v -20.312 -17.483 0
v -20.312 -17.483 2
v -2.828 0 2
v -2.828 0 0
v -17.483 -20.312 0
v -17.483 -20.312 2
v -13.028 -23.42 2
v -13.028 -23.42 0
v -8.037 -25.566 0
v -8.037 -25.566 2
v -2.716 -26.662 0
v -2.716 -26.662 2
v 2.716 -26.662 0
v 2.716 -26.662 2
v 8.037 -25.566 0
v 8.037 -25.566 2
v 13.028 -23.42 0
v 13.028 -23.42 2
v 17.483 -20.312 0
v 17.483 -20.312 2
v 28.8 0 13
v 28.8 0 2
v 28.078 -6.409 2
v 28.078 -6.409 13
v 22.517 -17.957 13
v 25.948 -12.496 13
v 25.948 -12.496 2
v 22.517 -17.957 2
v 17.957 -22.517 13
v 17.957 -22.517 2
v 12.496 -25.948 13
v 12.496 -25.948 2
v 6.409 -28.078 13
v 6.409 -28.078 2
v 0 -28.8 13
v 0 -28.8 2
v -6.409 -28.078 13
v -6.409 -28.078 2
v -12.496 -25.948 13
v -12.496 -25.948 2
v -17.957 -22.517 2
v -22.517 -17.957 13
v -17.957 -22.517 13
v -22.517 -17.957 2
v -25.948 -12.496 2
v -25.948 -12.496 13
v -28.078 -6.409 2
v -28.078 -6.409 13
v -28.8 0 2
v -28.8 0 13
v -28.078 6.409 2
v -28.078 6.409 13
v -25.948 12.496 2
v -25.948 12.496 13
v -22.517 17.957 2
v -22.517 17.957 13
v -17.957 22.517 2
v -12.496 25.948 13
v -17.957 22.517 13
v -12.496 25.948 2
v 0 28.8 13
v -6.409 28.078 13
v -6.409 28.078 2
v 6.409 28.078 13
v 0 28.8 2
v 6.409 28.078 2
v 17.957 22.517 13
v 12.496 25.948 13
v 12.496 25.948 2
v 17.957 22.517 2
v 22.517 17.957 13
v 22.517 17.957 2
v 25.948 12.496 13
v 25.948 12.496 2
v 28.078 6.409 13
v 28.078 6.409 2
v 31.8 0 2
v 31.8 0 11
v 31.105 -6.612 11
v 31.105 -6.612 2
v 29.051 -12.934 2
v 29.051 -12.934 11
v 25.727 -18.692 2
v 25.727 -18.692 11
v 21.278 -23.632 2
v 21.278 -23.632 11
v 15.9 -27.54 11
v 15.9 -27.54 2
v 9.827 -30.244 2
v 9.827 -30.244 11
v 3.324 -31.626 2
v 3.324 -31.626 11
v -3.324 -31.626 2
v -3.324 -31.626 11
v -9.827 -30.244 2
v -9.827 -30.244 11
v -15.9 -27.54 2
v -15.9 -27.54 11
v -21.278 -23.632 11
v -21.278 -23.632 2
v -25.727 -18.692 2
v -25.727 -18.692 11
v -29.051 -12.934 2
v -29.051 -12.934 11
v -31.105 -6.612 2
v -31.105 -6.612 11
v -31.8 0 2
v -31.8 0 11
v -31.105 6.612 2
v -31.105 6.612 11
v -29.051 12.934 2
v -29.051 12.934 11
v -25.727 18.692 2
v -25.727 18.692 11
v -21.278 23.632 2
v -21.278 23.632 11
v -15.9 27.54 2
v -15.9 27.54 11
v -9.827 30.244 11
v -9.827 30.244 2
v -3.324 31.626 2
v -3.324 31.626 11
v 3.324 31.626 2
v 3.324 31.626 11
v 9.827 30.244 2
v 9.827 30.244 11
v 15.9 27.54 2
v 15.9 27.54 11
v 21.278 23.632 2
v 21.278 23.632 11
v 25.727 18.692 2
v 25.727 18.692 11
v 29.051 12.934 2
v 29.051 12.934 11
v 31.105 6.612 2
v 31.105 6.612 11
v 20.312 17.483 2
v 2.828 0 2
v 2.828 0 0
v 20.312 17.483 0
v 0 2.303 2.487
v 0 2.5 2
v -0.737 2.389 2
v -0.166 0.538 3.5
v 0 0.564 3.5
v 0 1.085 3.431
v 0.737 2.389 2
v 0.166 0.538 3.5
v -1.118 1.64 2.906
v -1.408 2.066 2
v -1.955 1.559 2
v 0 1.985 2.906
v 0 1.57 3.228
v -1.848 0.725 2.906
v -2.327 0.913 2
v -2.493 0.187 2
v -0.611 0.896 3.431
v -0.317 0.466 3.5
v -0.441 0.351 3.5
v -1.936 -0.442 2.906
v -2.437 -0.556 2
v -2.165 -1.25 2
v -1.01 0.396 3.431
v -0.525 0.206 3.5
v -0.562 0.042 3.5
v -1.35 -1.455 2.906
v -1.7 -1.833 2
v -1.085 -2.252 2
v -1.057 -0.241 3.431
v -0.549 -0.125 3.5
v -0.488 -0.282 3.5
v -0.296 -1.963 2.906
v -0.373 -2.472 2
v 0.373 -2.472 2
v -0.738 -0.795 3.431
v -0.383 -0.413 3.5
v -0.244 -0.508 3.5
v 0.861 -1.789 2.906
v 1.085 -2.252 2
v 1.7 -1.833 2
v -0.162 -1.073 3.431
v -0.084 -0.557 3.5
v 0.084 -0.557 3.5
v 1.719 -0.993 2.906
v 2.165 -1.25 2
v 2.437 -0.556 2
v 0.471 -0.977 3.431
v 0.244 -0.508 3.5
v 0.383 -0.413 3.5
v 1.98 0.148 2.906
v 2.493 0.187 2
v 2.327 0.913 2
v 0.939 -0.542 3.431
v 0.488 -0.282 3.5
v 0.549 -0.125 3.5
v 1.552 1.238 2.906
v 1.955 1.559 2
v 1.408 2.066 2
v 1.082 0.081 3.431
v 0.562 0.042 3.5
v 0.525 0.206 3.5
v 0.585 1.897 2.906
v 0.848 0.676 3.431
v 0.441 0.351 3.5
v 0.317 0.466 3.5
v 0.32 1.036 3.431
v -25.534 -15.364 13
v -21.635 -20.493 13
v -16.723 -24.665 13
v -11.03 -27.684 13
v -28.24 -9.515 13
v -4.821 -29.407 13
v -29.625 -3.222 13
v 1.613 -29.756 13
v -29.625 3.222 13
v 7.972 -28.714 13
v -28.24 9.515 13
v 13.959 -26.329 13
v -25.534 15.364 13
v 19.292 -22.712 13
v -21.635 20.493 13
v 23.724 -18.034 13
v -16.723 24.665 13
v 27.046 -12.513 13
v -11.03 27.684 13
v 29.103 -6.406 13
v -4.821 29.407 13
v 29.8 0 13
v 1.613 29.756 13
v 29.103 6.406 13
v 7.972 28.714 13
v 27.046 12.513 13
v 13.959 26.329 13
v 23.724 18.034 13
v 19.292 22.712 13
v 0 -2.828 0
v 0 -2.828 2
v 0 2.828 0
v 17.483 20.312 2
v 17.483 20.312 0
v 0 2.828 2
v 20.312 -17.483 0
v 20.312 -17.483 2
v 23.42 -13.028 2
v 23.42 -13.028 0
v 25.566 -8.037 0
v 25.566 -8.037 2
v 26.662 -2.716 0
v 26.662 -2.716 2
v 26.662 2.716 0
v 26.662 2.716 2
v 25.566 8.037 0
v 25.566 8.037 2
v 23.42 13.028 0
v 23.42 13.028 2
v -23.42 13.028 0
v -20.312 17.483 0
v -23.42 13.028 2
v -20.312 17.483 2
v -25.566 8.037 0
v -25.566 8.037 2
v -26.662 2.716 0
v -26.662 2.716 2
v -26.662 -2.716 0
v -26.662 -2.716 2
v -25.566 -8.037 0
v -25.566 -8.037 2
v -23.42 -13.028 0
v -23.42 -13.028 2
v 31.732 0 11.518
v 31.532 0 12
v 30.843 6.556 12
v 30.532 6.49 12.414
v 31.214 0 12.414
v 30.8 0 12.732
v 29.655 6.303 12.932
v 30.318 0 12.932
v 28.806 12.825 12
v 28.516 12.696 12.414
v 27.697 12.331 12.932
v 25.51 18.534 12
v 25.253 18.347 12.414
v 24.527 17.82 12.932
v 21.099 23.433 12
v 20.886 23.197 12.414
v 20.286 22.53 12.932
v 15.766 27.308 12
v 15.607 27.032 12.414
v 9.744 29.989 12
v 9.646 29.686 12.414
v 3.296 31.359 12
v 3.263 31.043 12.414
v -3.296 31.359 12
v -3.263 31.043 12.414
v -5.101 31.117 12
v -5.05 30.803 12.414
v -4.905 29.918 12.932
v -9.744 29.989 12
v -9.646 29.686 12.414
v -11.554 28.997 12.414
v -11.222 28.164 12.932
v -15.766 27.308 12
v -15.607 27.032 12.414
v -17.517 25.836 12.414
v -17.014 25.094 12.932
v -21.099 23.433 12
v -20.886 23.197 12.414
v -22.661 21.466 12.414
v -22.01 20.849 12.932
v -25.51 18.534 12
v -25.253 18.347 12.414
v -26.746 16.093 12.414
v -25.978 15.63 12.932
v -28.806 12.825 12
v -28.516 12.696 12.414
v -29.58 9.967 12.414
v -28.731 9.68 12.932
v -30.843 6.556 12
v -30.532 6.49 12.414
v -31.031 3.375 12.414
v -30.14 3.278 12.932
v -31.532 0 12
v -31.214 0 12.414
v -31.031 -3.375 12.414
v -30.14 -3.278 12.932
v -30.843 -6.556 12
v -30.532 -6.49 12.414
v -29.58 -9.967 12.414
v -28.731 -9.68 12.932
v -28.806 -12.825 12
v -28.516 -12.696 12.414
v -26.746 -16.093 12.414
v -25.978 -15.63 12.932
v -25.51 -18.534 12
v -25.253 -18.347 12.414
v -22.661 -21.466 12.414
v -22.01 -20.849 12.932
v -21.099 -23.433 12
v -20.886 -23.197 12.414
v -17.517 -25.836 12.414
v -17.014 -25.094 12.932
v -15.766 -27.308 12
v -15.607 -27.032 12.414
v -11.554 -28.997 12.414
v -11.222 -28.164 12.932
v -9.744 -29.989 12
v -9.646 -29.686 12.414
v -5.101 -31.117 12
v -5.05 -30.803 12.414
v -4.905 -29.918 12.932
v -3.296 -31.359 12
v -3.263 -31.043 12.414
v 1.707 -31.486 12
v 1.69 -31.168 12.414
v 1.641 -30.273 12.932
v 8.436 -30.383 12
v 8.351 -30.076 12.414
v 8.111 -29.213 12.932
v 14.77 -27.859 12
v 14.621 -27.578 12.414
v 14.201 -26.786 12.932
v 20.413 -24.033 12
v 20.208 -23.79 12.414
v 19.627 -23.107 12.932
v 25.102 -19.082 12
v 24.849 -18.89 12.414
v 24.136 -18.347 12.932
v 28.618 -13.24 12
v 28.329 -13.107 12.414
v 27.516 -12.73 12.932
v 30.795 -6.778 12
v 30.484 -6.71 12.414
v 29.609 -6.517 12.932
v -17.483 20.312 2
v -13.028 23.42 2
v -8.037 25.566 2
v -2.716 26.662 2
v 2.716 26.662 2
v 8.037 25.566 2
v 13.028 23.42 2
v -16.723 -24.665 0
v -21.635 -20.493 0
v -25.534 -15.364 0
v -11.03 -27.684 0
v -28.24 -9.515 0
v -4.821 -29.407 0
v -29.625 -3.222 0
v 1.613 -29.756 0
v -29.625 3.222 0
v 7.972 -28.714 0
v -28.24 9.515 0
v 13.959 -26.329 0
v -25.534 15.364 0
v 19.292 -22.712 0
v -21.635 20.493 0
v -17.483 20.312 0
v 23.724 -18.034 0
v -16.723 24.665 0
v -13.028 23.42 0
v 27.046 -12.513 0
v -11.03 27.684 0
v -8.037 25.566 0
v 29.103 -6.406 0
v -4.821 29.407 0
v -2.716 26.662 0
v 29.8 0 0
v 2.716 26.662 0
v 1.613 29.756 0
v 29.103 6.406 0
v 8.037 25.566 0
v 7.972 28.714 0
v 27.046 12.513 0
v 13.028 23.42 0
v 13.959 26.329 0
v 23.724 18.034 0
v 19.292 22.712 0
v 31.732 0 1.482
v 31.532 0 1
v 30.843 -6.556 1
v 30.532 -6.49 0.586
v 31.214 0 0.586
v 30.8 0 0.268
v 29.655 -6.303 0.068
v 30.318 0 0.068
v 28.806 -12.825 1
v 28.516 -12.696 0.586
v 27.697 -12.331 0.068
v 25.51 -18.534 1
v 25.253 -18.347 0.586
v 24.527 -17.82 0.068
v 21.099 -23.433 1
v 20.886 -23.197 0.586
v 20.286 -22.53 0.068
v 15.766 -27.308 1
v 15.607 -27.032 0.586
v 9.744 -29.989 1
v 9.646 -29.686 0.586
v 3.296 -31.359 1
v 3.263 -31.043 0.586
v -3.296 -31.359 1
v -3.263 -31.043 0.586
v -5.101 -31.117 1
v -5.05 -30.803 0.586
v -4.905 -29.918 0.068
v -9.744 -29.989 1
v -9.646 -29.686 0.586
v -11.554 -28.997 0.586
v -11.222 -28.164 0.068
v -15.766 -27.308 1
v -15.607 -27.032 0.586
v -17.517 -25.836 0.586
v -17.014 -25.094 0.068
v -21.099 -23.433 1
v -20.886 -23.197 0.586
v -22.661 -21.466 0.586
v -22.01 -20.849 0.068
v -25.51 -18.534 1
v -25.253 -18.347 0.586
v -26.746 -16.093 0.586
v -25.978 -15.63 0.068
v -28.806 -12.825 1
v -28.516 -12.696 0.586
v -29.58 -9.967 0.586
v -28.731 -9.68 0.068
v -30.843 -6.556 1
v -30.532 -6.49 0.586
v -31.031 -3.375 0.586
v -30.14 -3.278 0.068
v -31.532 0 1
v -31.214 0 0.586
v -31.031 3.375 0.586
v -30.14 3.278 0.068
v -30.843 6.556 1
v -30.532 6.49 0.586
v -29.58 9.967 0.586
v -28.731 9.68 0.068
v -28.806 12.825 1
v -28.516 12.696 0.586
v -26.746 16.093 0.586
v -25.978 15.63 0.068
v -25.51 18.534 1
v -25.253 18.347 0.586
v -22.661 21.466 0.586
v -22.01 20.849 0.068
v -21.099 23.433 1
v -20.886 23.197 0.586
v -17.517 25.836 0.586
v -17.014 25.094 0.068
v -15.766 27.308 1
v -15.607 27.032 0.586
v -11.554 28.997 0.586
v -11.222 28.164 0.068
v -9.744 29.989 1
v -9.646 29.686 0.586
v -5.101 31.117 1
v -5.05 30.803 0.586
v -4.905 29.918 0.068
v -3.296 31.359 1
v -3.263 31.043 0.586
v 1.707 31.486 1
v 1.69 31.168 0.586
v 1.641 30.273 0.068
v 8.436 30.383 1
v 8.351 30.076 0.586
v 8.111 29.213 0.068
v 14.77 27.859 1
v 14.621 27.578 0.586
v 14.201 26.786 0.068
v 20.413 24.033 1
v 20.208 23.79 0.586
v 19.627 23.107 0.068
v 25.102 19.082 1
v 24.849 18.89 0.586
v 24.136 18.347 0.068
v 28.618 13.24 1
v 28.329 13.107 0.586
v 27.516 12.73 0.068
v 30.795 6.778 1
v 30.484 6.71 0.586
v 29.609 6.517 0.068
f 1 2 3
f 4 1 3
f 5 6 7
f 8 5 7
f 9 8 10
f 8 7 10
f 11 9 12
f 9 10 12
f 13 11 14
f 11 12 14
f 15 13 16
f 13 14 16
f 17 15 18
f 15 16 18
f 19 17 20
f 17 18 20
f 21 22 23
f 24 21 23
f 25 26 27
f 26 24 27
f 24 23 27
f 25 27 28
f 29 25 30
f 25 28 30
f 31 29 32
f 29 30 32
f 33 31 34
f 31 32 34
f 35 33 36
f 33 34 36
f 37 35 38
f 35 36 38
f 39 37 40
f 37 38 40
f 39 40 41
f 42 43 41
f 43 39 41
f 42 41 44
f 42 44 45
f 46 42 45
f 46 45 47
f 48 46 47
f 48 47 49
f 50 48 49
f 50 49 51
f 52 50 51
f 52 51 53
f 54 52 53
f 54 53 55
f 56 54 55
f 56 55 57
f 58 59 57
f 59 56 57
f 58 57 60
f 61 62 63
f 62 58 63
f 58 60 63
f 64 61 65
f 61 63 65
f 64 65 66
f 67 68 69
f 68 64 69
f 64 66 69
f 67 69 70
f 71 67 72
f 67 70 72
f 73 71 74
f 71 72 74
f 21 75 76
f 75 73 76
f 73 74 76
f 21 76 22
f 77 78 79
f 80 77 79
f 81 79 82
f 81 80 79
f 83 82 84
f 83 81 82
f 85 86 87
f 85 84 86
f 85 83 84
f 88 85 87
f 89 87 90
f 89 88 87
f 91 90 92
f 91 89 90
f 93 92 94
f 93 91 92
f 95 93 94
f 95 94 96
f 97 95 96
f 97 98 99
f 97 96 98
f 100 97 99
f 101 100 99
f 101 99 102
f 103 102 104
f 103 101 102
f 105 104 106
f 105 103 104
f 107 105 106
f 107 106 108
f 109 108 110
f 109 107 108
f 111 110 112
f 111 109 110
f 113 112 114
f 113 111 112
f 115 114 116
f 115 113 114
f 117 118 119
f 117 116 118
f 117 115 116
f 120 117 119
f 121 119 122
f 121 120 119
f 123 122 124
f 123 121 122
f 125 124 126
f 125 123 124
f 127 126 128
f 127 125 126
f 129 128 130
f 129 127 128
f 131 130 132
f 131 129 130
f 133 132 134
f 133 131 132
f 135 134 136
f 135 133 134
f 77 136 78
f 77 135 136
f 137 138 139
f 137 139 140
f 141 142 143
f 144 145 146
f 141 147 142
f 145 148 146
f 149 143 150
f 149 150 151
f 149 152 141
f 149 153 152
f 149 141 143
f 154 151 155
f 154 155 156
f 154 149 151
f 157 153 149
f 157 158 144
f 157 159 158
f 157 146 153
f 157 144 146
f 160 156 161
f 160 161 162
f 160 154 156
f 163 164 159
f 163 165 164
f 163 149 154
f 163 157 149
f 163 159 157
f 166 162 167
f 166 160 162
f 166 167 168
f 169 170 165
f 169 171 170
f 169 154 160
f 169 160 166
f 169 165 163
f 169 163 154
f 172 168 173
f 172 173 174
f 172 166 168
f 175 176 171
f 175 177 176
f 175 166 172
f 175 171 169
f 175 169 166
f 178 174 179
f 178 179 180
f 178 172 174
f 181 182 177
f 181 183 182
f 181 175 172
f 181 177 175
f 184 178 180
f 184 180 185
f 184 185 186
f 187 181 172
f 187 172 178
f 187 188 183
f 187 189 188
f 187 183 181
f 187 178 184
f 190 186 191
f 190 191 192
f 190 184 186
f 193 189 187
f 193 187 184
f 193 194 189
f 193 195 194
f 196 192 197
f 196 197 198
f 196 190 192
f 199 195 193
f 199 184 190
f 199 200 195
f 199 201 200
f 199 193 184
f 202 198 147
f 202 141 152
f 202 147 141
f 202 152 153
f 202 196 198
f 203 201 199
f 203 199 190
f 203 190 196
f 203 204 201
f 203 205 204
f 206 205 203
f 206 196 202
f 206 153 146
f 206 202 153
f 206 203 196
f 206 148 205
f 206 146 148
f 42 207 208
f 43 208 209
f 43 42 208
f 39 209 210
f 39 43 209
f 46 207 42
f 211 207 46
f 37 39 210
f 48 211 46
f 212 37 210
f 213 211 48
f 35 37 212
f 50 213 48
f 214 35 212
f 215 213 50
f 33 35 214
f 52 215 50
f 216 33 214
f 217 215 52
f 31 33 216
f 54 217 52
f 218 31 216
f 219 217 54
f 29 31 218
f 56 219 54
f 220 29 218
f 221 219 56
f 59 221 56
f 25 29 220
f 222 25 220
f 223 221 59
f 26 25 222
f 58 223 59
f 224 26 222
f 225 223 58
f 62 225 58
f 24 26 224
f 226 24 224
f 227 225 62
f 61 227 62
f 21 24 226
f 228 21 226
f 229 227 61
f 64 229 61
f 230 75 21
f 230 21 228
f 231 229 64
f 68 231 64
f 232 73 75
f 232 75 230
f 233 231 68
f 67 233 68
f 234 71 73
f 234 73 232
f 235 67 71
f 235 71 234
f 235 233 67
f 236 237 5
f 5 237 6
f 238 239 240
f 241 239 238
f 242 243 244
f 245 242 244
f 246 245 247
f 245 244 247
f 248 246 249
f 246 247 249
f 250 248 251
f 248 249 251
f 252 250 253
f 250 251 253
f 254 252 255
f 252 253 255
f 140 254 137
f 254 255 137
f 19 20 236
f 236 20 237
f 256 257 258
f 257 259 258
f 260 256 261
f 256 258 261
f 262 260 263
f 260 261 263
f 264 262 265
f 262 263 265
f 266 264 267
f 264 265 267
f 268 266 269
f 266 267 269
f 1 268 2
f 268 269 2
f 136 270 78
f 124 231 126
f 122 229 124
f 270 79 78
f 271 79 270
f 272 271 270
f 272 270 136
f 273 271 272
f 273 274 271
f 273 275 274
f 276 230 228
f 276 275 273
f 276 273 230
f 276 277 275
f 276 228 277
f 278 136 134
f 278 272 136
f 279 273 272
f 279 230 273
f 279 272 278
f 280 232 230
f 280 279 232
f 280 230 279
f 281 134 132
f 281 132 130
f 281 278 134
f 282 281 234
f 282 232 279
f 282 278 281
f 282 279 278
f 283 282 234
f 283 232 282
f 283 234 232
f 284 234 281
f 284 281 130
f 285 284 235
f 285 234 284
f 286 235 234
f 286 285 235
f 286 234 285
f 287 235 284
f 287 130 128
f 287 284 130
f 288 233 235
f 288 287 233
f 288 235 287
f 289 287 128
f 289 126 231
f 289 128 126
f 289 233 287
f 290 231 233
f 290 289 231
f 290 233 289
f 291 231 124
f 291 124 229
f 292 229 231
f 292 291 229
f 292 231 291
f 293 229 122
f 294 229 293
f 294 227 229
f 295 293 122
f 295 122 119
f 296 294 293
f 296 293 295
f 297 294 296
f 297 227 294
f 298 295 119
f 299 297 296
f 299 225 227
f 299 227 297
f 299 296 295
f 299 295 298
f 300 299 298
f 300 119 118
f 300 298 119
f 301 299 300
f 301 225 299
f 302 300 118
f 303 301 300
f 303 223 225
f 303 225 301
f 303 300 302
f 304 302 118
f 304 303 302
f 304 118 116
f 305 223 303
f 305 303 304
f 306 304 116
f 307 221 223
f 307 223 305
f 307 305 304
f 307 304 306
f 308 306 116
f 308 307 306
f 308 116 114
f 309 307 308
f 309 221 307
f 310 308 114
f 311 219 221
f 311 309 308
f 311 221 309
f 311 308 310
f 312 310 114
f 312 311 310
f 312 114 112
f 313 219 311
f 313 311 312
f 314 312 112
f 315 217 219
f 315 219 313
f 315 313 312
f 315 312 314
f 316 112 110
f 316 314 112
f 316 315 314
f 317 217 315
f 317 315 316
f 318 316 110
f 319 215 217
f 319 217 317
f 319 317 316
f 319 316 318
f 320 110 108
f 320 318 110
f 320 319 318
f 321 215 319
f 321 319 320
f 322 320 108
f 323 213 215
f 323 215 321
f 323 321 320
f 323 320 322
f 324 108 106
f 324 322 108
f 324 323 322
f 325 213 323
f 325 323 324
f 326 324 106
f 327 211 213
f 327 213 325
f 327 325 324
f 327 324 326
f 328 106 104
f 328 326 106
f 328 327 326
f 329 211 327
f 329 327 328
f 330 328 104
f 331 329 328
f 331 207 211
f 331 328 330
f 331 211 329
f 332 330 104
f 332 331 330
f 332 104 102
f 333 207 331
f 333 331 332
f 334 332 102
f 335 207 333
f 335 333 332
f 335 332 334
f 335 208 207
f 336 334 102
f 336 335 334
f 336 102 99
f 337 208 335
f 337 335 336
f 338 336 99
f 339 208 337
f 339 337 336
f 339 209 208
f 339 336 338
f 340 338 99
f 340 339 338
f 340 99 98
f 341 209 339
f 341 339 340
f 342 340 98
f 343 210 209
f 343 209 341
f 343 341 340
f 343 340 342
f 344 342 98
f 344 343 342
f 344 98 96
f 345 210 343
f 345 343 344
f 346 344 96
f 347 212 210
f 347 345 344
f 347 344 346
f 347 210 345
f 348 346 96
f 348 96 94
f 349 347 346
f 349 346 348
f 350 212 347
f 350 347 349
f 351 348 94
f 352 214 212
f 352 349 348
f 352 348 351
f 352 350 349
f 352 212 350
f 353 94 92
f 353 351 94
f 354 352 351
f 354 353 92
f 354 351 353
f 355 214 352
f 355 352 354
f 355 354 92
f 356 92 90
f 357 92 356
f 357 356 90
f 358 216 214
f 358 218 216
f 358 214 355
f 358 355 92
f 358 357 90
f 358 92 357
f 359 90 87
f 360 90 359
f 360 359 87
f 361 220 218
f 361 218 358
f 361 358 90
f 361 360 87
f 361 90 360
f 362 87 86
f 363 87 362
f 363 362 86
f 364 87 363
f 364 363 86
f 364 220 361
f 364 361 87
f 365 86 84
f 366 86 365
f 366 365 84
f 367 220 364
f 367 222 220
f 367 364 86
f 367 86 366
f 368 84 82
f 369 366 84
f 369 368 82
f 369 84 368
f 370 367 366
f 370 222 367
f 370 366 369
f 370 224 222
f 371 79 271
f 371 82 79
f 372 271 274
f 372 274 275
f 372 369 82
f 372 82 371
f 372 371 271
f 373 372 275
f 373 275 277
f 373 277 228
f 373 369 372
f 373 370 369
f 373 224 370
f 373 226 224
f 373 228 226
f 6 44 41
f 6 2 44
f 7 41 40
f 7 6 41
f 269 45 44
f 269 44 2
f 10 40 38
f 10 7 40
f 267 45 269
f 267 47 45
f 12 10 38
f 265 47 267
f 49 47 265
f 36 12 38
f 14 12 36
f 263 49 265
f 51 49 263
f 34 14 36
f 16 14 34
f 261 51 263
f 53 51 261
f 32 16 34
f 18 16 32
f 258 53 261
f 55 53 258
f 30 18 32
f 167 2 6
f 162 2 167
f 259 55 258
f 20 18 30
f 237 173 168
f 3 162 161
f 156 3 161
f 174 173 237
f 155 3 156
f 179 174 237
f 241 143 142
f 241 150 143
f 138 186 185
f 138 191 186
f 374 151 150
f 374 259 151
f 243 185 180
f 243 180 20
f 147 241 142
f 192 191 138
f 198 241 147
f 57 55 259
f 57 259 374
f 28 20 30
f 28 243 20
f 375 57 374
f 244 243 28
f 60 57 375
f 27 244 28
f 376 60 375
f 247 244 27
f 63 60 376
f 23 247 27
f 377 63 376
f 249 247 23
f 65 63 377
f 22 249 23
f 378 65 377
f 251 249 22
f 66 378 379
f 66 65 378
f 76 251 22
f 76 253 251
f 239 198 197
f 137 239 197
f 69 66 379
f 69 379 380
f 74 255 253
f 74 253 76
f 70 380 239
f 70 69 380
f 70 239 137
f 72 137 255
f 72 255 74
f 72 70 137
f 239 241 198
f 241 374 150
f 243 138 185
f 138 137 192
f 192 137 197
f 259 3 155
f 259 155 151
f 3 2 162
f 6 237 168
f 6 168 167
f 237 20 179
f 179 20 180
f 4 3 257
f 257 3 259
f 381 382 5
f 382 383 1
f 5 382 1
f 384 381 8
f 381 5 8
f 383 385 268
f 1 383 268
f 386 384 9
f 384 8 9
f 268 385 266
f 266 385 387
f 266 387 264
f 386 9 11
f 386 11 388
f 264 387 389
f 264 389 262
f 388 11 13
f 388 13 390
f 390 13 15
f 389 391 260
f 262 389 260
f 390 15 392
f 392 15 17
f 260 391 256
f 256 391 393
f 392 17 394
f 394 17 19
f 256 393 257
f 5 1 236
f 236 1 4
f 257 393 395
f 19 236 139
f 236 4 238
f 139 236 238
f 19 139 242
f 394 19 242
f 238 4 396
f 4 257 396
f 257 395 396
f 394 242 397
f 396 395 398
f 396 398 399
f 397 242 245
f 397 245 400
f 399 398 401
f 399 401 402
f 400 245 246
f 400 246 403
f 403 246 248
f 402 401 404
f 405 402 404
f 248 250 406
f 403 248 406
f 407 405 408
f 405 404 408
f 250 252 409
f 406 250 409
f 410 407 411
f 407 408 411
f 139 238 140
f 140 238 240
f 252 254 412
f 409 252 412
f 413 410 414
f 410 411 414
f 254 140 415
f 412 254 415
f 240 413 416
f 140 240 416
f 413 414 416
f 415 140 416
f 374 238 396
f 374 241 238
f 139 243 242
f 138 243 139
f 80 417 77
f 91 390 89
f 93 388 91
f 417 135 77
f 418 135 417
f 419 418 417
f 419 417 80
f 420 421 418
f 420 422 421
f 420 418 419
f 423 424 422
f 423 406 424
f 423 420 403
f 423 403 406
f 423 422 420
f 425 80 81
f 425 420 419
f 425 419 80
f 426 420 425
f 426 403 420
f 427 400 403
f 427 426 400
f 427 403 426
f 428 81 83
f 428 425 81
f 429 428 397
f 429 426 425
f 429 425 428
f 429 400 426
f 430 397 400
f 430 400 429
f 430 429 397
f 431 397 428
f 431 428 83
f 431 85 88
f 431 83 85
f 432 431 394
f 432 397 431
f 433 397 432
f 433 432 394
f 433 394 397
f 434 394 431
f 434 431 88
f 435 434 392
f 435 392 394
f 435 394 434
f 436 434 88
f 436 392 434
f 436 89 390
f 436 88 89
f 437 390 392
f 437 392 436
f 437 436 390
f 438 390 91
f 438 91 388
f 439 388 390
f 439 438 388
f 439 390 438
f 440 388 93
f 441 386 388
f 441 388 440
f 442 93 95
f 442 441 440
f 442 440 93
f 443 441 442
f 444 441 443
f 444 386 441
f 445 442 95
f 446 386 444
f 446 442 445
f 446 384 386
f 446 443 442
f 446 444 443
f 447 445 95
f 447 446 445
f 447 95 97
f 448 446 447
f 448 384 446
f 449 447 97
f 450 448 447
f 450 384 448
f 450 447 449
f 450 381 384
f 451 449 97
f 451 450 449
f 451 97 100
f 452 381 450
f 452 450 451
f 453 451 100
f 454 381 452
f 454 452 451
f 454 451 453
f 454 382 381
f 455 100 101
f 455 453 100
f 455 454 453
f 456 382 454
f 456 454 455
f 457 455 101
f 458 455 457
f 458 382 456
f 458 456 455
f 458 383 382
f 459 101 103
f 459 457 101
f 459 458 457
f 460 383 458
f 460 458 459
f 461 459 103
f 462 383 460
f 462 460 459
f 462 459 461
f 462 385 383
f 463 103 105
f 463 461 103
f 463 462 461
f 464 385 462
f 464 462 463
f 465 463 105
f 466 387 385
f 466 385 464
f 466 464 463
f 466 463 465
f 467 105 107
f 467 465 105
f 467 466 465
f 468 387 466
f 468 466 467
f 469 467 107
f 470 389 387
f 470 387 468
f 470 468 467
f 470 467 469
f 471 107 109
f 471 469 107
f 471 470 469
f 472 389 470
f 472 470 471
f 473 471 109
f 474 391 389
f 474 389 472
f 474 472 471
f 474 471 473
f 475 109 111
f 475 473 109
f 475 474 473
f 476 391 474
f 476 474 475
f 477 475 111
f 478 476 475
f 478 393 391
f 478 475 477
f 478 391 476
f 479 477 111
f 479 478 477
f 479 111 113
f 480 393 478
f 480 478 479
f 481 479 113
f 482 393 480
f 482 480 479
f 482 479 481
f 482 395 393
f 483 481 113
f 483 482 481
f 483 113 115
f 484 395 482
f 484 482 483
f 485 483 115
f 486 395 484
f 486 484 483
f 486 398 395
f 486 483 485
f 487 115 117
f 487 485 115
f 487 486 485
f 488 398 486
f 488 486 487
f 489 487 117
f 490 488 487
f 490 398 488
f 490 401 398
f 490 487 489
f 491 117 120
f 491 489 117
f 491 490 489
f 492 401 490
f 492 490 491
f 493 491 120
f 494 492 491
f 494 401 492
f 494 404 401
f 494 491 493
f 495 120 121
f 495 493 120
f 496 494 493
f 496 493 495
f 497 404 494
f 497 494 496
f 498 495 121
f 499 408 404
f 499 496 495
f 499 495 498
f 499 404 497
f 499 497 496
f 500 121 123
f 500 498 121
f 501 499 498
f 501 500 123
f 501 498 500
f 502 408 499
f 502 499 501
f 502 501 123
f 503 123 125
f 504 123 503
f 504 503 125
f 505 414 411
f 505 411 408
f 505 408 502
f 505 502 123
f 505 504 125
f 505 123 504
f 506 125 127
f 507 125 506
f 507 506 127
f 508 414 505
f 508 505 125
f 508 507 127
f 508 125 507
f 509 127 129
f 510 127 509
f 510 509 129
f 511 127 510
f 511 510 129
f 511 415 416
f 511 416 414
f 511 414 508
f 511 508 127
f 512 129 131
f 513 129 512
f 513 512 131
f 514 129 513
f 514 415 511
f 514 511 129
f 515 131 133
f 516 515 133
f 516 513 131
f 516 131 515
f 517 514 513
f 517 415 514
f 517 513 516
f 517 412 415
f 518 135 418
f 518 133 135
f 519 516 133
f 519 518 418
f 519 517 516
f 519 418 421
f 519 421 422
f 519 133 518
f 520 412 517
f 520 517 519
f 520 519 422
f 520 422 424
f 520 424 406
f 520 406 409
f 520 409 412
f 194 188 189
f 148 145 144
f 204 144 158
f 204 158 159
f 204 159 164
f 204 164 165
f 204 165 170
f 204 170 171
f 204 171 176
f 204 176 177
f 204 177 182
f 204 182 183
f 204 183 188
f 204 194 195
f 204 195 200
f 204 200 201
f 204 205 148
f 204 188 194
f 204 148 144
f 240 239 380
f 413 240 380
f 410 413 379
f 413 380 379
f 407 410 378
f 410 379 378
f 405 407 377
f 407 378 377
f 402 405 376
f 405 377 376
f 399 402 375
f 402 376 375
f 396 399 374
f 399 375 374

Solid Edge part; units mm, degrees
sketch "Sketch1" plane through (0, 0, 0) normal (0, 0, 1) x (1, 0, 0)
  circle A0 centre (0, 0) radius 31.8
extrude "Protrusion1" add sketch "Sketch1" along normal blind 2
sketch "Sketch2" plane through (0, 0, 0) normal (0, 0, 1) x (1, 0, 0)
  circle A0 centre (0, 0) radius 28.8
  circle A1 centre (0, 0) radius 31.8
  dimension "D1" = 3
extrude "ExtrudedProtrusion_3" add sketch "Sketch2" along normal blind 13
fillet "Round_2" radius 2 1 edges at (-31.8, 0, 0)
sketch "Sketch3" plane through (0, 0, 2) normal (0, 0, 1) x (0, 1, 0)
  circle A0 centre (0, 0) radius 2.5
extrude "ExtrudedProtrusion_4" add sketch "Sketch3" along normal blind 1.5
fillet "Round_3" radius 2 1 edges at (0, -2.5, 3.5)
fillet "Round_4" radius 2 1 edges at (-31.8, 0, 13)
sketch "Sketch4" plane through (0, 0, 2) normal (0, 0, 1) x (1, 0, 0)
  line L0 (-20.3118, -17.4834) -> (-2.8284, 0)
  line L1 (-2.8284, 0) -> (-20.3118, 17.4834)
  arc A0 (-20.3118, 17.4834) -> (-20.3118, -17.4834) centre (0, 0) ccw
  line L2 (0, -2.8284) -> (-17.4834, -20.3118)
  arc A1 (-17.4834, -20.3118) -> (17.4834, -20.3118) centre (0, 0) ccw
  line L3 (17.4834, -20.3118) -> (0, -2.8284)
  line L4 (17.4834, 20.3118) -> (0, 2.8284)
  line L5 (0, 2.8284) -> (-17.4834, 20.3118)
  arc A2 (-17.4834, 20.3118) -> (17.4834, 20.3118) centre (0, 0) cw
  line L6 (2.8284, 0) -> (20.3118, 17.4834)
  arc A3 (20.3118, 17.4834) -> (20.3118, -17.4834) centre (0, 0) cw
  line L7 (20.3118, -17.4834) -> (2.8284, 0)
extrude "ExtrudedCutout_1" cut sketch "Sketch4" against normal blind 22.2905
